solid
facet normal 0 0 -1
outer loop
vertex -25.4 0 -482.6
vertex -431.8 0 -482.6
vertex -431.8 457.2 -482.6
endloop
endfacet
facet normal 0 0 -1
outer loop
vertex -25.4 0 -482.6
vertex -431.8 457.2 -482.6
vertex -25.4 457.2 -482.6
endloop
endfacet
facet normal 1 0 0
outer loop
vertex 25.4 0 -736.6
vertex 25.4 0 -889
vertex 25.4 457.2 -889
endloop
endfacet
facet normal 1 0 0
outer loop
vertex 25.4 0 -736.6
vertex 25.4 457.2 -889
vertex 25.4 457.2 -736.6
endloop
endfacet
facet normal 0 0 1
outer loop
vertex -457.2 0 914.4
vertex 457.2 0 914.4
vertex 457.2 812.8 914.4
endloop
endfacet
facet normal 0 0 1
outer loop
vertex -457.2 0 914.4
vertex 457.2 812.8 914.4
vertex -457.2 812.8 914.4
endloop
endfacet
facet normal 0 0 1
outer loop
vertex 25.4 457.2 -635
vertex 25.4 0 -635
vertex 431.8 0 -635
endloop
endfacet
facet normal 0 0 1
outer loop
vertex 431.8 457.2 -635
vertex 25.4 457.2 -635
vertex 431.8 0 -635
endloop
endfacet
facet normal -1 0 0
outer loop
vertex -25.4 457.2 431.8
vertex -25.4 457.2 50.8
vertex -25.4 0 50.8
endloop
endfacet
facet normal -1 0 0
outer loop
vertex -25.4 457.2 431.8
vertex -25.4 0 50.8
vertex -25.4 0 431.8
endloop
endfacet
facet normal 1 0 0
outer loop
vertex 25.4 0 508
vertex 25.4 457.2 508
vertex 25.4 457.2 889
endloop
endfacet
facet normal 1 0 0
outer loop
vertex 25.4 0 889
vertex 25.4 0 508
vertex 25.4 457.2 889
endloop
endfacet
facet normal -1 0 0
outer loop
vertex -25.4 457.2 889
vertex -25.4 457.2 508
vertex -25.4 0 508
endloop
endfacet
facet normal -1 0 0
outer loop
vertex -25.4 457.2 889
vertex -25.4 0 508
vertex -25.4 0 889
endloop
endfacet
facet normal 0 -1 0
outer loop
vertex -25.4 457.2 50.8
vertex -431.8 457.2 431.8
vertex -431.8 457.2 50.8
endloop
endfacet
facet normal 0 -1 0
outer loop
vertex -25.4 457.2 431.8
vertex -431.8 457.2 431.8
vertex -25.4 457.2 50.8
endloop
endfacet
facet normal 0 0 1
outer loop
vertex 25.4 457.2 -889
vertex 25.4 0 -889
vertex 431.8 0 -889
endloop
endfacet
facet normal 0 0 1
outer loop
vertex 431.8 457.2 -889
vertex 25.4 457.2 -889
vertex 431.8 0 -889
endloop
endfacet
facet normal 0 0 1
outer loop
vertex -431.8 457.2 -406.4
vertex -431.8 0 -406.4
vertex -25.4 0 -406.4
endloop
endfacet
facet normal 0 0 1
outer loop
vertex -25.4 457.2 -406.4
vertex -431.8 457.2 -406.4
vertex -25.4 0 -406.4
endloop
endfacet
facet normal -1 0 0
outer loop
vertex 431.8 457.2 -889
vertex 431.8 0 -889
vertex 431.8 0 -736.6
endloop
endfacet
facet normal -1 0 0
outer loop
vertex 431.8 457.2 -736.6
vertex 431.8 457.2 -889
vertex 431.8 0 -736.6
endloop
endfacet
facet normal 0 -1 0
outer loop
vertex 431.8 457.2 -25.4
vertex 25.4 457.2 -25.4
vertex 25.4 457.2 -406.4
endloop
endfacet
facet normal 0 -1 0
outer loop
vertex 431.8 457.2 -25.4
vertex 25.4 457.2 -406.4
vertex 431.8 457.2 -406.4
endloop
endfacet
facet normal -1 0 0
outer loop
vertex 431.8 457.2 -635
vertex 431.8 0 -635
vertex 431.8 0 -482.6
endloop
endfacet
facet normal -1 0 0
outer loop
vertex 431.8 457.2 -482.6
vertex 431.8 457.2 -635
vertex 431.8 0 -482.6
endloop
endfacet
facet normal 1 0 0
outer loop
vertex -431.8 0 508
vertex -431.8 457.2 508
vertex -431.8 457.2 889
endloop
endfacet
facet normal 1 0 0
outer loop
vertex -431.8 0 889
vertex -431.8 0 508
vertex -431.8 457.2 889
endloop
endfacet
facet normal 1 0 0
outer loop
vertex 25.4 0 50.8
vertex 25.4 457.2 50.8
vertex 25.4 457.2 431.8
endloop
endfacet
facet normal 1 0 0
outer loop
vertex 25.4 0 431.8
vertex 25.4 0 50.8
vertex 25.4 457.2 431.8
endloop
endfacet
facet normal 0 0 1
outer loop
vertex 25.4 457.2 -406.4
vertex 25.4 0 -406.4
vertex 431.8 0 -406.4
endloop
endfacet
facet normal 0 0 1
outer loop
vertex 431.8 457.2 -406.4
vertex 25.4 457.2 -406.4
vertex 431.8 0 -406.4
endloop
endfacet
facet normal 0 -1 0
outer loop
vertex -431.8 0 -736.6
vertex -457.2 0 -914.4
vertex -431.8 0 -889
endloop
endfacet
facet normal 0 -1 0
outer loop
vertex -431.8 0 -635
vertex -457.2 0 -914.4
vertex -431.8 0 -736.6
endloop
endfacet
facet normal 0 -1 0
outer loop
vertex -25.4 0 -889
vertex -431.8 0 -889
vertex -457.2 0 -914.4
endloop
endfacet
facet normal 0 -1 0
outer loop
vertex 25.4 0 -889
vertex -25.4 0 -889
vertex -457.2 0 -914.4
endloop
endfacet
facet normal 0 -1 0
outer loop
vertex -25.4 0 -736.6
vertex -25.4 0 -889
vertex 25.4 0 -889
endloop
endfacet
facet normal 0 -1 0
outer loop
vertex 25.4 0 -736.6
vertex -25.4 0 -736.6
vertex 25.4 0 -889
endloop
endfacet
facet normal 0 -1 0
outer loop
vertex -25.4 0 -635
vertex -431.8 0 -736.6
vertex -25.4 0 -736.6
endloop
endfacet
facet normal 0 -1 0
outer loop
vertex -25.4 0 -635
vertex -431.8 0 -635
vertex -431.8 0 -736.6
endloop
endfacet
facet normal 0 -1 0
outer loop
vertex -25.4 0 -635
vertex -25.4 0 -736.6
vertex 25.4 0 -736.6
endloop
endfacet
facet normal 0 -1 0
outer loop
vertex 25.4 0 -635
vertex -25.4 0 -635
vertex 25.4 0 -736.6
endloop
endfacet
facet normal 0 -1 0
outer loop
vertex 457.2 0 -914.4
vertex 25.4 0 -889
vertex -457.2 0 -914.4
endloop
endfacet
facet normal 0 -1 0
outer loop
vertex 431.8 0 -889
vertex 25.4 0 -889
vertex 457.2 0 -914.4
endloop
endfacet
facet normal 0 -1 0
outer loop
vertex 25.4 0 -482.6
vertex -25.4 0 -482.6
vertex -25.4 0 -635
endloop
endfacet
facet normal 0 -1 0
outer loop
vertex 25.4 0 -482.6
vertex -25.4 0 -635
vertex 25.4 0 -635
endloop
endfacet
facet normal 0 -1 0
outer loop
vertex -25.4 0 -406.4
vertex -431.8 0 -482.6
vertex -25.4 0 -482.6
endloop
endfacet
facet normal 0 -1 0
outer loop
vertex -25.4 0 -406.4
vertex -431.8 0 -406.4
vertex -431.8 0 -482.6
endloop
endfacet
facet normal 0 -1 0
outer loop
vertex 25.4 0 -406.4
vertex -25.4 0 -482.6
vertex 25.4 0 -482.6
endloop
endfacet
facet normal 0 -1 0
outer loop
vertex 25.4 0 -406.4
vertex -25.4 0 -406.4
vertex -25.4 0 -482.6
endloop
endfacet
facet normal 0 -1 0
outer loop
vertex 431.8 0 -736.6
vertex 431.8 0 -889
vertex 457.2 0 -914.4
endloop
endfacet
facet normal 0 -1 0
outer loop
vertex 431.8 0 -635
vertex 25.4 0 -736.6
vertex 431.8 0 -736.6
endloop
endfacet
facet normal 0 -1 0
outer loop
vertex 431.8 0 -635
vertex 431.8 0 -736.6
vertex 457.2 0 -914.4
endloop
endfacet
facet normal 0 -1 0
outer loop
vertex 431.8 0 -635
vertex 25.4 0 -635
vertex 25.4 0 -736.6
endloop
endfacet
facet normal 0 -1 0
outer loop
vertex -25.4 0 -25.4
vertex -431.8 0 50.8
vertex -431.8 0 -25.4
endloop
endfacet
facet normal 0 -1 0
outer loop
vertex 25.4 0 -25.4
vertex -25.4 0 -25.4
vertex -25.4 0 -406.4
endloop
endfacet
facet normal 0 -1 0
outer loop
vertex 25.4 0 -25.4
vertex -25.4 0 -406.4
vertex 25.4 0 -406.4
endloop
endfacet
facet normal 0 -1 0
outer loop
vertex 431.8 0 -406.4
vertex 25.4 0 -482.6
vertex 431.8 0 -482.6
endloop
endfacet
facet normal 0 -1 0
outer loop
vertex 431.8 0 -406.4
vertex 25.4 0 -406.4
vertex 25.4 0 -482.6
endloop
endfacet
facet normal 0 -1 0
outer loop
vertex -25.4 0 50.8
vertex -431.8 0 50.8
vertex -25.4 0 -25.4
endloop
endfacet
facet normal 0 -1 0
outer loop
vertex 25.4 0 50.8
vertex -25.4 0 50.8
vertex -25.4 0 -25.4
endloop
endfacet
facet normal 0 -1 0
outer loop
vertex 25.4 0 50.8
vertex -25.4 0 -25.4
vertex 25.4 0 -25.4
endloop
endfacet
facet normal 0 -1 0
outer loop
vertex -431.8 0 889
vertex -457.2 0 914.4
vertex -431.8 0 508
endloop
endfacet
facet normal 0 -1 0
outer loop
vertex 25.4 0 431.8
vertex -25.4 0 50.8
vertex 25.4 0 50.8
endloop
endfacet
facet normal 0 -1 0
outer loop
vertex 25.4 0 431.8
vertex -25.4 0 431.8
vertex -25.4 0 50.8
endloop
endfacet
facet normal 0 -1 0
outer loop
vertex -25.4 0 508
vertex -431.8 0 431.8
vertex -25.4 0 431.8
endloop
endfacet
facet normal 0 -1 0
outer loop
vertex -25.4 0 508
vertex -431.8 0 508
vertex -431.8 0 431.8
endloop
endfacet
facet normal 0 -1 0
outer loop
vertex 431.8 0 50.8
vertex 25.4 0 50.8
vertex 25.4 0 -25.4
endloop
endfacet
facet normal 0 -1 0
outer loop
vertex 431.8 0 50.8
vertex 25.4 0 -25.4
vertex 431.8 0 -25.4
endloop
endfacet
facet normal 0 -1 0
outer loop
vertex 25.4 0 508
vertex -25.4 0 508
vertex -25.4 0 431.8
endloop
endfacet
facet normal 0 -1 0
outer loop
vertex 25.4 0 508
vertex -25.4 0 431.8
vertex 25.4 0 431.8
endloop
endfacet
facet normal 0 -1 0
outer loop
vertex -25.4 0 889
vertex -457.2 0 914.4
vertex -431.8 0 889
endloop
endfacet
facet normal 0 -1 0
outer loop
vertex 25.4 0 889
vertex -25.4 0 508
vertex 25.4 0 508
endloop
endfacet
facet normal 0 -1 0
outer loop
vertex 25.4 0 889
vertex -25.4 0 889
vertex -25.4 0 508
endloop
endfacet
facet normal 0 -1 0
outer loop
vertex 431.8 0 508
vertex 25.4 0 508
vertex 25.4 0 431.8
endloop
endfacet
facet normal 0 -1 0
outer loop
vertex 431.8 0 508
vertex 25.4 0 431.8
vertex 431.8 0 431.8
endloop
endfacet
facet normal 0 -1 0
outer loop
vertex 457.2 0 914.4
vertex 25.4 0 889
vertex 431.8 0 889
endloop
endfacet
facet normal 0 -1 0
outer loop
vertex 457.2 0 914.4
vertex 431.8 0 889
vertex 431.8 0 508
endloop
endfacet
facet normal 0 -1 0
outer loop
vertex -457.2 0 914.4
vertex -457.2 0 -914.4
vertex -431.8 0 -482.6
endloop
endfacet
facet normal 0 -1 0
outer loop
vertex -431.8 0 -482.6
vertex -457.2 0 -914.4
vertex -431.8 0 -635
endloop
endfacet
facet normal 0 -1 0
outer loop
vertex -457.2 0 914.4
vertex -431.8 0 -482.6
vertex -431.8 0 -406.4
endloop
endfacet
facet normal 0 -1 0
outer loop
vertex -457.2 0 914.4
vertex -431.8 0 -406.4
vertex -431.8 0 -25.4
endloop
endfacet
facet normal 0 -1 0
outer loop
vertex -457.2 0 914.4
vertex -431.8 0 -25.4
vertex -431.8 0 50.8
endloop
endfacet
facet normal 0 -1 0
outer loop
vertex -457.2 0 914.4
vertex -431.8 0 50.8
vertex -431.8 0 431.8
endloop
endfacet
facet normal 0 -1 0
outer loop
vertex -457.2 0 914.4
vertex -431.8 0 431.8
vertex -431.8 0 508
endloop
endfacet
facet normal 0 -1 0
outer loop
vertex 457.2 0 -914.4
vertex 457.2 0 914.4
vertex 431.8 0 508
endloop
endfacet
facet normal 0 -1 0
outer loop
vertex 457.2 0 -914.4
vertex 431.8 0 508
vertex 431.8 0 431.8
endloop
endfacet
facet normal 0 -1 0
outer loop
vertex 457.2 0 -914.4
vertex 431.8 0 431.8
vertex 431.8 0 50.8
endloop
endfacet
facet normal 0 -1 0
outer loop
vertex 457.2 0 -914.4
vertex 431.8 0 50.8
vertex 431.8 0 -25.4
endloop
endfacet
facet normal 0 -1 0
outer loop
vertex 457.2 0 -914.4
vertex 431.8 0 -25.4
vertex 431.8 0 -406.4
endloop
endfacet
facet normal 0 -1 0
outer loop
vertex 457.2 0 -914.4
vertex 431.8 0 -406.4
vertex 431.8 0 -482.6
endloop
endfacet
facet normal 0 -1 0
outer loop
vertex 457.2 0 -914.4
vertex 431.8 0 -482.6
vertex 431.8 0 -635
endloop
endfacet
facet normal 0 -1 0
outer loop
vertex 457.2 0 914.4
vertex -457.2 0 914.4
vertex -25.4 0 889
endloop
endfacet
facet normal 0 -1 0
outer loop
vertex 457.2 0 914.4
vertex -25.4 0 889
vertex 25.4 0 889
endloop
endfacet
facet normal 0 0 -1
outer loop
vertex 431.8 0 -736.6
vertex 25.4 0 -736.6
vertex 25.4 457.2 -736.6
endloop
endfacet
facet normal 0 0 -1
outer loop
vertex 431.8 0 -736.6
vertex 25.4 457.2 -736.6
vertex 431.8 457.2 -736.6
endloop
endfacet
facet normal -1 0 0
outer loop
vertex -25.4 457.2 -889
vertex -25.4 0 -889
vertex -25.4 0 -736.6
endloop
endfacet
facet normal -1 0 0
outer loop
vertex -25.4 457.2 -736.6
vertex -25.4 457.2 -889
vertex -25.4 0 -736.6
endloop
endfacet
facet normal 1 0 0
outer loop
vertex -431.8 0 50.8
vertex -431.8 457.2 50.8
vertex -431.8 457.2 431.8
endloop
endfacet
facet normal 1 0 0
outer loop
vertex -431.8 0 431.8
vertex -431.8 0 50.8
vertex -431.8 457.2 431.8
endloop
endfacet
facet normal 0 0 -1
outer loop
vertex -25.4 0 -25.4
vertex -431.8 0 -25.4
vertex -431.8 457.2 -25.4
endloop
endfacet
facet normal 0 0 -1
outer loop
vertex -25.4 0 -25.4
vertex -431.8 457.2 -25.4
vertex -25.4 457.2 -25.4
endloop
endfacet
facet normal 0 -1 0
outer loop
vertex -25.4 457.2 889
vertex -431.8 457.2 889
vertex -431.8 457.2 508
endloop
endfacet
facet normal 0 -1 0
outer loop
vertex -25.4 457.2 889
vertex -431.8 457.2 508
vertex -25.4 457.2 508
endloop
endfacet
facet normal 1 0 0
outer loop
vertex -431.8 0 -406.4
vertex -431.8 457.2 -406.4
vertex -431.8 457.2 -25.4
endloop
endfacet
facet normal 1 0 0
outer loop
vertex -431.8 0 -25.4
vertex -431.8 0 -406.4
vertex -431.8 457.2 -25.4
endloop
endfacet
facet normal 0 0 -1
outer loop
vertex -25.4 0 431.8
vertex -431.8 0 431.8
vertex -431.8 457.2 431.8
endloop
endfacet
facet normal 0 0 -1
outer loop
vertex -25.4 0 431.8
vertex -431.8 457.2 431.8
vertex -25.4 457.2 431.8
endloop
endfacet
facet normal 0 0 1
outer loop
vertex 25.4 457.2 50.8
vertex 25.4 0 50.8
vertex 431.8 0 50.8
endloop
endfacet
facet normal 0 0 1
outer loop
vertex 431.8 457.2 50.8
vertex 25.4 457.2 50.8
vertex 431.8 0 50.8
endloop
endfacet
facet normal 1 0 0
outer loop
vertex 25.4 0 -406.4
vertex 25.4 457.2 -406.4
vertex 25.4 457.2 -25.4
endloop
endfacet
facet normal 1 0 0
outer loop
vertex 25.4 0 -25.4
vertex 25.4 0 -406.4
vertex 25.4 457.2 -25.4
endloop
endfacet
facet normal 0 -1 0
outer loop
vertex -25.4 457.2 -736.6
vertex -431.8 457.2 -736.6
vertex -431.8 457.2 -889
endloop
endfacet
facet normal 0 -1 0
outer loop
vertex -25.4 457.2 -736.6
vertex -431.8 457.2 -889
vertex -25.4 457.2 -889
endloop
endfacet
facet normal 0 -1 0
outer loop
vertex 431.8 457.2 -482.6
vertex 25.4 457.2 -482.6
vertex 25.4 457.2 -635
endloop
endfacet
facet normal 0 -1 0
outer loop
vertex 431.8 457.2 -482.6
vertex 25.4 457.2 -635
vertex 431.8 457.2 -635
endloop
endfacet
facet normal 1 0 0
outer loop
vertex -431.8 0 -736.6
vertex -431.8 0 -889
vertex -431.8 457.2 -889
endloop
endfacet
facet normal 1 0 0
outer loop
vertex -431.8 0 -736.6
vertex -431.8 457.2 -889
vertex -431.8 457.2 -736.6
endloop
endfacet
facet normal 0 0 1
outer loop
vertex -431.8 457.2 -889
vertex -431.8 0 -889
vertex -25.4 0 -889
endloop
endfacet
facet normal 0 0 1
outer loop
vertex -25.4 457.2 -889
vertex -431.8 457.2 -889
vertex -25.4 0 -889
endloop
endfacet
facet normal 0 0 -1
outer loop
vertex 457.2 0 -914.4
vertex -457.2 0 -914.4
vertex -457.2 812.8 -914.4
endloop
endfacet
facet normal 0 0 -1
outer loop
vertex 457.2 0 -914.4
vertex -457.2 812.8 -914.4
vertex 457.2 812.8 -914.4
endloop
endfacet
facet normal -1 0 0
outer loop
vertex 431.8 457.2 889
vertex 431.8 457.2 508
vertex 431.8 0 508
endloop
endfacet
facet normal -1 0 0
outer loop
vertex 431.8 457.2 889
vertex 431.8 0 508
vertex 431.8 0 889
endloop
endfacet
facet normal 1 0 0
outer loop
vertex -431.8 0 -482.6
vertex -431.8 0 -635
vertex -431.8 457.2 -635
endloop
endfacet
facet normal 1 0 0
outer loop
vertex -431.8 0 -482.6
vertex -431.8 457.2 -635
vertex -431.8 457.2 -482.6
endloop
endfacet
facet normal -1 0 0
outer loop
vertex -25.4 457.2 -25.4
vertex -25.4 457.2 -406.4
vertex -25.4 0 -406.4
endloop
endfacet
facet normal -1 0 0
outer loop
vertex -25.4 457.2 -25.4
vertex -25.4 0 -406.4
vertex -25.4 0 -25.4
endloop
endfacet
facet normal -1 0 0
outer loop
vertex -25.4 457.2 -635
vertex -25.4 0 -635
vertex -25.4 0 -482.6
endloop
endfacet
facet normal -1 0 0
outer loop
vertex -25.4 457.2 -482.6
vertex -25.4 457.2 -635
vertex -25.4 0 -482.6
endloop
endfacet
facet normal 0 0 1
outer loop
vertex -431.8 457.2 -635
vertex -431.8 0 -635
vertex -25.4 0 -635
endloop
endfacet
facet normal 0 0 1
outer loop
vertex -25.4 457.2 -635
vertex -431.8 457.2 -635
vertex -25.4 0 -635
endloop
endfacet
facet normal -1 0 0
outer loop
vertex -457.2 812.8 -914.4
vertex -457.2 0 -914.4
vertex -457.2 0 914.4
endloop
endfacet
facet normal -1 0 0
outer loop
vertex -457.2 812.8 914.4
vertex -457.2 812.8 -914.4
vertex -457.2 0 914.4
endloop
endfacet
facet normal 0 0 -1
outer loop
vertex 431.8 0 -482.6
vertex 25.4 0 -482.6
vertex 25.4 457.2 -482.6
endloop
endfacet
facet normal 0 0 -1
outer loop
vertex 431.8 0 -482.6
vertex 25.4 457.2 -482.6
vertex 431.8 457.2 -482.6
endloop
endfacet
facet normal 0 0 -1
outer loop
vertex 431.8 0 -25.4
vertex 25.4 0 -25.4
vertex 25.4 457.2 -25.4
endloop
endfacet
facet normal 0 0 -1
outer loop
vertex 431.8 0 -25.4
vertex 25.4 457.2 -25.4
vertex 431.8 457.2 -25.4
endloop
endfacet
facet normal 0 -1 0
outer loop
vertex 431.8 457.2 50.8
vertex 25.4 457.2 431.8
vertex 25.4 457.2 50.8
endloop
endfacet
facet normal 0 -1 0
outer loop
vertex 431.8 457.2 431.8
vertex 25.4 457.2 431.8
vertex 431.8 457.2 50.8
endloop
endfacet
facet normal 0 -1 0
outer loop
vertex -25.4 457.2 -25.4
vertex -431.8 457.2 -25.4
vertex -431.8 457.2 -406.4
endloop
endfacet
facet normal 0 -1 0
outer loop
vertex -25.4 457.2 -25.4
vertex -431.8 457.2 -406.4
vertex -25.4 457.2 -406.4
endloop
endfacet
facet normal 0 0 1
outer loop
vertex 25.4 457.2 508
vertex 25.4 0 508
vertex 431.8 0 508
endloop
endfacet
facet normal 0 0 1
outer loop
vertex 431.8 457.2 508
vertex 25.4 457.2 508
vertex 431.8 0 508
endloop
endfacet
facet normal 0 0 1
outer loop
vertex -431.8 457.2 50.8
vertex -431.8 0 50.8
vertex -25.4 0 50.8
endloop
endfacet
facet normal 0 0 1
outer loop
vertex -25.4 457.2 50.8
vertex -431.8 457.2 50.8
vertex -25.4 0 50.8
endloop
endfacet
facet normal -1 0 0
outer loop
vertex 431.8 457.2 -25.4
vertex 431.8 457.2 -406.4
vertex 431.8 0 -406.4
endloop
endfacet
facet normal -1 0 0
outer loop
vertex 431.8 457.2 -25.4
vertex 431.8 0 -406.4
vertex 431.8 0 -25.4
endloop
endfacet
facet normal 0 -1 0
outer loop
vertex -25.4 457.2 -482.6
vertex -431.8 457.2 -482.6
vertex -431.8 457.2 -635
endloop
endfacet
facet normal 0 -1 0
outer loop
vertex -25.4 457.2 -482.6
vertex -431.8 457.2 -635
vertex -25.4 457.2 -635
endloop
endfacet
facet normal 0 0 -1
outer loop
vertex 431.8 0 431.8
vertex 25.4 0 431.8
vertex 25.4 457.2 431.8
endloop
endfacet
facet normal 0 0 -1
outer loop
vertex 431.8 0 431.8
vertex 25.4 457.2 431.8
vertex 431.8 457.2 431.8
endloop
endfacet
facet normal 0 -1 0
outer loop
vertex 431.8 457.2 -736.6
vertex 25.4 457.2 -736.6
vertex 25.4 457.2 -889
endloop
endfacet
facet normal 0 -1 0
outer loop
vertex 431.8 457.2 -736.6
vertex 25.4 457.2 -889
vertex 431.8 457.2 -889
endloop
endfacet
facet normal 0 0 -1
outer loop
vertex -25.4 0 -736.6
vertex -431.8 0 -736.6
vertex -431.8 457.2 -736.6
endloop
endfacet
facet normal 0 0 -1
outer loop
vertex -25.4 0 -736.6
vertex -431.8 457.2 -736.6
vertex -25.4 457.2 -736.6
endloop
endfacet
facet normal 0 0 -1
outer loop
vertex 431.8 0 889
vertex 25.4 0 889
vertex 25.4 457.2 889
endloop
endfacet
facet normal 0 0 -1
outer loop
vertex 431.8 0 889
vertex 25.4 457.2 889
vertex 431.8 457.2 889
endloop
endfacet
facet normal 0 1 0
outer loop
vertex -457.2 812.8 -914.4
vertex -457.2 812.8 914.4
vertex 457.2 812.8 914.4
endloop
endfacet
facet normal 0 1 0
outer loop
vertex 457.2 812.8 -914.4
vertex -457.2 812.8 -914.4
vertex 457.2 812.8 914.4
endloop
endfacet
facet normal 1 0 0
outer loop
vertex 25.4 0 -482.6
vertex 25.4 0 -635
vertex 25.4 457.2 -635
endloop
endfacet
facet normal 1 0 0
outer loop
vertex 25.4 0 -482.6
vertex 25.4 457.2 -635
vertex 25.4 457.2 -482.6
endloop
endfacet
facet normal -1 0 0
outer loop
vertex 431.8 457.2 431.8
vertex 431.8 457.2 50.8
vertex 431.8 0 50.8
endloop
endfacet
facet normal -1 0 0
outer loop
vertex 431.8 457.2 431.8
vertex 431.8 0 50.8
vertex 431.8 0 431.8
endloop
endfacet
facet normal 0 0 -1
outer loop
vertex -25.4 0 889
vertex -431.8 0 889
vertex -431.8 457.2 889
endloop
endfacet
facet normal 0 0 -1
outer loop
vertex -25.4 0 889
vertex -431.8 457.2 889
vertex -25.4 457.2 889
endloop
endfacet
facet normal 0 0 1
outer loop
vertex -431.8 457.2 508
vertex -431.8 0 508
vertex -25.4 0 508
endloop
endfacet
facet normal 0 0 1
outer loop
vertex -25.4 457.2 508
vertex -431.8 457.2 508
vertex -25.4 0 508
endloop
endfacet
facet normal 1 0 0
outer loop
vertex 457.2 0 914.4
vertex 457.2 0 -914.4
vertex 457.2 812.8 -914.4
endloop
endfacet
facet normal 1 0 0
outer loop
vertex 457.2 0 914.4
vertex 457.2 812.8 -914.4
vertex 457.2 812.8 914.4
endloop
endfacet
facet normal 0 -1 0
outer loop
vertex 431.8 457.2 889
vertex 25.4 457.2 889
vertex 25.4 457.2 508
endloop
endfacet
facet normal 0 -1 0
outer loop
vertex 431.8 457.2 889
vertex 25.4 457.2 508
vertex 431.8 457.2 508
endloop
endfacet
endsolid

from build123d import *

# Parameters (mm, degrees)
F0_W     = 457.2
F0_H     = 1828.8
F1_DEPTH = 812.8
F2_W     = 406.4
F2_H     = 381
F2_H_2   = 152.4
F3_DEPTH = 457.2


with BuildPart() as f1:
    # F0 (on Front) → F1 (new body)
    with BuildSketch(Plane.XZ):
        with Locations((-228.6, 0)):
            Rectangle(F0_W, F0_H)
        with Locations((228.6, 0)):
            Rectangle(F0_W, F0_H)
    extrude(amount=-F1_DEPTH)

    # F2 (on face) → F3 (cut)
    with BuildSketch(Plane.XZ):
        with Locations((228.6, 698.5)):
            Rectangle(F2_W, F2_H)
        with Locations((228.6, 241.3)):
            Rectangle(F2_W, F2_H)
        with Locations((-228.6, 698.5)):
            Rectangle(F2_W, F2_H)
        with Locations((228.6, -215.9)):
            Rectangle(F2_W, F2_H)
        with Locations((-228.6, 241.3)):
            Rectangle(F2_W, F2_H)
        with Locations((228.6, -558.8)):
            Rectangle(F2_W, F2_H_2)
        with Locations((-228.6, -215.9)):
            Rectangle(F2_W, F2_H)
        with Locations((228.6, -812.8)):
            Rectangle(F2_W, F2_H_2)
        with Locations((-228.6, -558.8)):
            Rectangle(F2_W, F2_H_2)
        with Locations((-228.6, -812.8)):
            Rectangle(F2_W, F2_H_2)
    extrude(amount=-F3_DEPTH, mode=Mode.SUBTRACT)


solid = f1.part
